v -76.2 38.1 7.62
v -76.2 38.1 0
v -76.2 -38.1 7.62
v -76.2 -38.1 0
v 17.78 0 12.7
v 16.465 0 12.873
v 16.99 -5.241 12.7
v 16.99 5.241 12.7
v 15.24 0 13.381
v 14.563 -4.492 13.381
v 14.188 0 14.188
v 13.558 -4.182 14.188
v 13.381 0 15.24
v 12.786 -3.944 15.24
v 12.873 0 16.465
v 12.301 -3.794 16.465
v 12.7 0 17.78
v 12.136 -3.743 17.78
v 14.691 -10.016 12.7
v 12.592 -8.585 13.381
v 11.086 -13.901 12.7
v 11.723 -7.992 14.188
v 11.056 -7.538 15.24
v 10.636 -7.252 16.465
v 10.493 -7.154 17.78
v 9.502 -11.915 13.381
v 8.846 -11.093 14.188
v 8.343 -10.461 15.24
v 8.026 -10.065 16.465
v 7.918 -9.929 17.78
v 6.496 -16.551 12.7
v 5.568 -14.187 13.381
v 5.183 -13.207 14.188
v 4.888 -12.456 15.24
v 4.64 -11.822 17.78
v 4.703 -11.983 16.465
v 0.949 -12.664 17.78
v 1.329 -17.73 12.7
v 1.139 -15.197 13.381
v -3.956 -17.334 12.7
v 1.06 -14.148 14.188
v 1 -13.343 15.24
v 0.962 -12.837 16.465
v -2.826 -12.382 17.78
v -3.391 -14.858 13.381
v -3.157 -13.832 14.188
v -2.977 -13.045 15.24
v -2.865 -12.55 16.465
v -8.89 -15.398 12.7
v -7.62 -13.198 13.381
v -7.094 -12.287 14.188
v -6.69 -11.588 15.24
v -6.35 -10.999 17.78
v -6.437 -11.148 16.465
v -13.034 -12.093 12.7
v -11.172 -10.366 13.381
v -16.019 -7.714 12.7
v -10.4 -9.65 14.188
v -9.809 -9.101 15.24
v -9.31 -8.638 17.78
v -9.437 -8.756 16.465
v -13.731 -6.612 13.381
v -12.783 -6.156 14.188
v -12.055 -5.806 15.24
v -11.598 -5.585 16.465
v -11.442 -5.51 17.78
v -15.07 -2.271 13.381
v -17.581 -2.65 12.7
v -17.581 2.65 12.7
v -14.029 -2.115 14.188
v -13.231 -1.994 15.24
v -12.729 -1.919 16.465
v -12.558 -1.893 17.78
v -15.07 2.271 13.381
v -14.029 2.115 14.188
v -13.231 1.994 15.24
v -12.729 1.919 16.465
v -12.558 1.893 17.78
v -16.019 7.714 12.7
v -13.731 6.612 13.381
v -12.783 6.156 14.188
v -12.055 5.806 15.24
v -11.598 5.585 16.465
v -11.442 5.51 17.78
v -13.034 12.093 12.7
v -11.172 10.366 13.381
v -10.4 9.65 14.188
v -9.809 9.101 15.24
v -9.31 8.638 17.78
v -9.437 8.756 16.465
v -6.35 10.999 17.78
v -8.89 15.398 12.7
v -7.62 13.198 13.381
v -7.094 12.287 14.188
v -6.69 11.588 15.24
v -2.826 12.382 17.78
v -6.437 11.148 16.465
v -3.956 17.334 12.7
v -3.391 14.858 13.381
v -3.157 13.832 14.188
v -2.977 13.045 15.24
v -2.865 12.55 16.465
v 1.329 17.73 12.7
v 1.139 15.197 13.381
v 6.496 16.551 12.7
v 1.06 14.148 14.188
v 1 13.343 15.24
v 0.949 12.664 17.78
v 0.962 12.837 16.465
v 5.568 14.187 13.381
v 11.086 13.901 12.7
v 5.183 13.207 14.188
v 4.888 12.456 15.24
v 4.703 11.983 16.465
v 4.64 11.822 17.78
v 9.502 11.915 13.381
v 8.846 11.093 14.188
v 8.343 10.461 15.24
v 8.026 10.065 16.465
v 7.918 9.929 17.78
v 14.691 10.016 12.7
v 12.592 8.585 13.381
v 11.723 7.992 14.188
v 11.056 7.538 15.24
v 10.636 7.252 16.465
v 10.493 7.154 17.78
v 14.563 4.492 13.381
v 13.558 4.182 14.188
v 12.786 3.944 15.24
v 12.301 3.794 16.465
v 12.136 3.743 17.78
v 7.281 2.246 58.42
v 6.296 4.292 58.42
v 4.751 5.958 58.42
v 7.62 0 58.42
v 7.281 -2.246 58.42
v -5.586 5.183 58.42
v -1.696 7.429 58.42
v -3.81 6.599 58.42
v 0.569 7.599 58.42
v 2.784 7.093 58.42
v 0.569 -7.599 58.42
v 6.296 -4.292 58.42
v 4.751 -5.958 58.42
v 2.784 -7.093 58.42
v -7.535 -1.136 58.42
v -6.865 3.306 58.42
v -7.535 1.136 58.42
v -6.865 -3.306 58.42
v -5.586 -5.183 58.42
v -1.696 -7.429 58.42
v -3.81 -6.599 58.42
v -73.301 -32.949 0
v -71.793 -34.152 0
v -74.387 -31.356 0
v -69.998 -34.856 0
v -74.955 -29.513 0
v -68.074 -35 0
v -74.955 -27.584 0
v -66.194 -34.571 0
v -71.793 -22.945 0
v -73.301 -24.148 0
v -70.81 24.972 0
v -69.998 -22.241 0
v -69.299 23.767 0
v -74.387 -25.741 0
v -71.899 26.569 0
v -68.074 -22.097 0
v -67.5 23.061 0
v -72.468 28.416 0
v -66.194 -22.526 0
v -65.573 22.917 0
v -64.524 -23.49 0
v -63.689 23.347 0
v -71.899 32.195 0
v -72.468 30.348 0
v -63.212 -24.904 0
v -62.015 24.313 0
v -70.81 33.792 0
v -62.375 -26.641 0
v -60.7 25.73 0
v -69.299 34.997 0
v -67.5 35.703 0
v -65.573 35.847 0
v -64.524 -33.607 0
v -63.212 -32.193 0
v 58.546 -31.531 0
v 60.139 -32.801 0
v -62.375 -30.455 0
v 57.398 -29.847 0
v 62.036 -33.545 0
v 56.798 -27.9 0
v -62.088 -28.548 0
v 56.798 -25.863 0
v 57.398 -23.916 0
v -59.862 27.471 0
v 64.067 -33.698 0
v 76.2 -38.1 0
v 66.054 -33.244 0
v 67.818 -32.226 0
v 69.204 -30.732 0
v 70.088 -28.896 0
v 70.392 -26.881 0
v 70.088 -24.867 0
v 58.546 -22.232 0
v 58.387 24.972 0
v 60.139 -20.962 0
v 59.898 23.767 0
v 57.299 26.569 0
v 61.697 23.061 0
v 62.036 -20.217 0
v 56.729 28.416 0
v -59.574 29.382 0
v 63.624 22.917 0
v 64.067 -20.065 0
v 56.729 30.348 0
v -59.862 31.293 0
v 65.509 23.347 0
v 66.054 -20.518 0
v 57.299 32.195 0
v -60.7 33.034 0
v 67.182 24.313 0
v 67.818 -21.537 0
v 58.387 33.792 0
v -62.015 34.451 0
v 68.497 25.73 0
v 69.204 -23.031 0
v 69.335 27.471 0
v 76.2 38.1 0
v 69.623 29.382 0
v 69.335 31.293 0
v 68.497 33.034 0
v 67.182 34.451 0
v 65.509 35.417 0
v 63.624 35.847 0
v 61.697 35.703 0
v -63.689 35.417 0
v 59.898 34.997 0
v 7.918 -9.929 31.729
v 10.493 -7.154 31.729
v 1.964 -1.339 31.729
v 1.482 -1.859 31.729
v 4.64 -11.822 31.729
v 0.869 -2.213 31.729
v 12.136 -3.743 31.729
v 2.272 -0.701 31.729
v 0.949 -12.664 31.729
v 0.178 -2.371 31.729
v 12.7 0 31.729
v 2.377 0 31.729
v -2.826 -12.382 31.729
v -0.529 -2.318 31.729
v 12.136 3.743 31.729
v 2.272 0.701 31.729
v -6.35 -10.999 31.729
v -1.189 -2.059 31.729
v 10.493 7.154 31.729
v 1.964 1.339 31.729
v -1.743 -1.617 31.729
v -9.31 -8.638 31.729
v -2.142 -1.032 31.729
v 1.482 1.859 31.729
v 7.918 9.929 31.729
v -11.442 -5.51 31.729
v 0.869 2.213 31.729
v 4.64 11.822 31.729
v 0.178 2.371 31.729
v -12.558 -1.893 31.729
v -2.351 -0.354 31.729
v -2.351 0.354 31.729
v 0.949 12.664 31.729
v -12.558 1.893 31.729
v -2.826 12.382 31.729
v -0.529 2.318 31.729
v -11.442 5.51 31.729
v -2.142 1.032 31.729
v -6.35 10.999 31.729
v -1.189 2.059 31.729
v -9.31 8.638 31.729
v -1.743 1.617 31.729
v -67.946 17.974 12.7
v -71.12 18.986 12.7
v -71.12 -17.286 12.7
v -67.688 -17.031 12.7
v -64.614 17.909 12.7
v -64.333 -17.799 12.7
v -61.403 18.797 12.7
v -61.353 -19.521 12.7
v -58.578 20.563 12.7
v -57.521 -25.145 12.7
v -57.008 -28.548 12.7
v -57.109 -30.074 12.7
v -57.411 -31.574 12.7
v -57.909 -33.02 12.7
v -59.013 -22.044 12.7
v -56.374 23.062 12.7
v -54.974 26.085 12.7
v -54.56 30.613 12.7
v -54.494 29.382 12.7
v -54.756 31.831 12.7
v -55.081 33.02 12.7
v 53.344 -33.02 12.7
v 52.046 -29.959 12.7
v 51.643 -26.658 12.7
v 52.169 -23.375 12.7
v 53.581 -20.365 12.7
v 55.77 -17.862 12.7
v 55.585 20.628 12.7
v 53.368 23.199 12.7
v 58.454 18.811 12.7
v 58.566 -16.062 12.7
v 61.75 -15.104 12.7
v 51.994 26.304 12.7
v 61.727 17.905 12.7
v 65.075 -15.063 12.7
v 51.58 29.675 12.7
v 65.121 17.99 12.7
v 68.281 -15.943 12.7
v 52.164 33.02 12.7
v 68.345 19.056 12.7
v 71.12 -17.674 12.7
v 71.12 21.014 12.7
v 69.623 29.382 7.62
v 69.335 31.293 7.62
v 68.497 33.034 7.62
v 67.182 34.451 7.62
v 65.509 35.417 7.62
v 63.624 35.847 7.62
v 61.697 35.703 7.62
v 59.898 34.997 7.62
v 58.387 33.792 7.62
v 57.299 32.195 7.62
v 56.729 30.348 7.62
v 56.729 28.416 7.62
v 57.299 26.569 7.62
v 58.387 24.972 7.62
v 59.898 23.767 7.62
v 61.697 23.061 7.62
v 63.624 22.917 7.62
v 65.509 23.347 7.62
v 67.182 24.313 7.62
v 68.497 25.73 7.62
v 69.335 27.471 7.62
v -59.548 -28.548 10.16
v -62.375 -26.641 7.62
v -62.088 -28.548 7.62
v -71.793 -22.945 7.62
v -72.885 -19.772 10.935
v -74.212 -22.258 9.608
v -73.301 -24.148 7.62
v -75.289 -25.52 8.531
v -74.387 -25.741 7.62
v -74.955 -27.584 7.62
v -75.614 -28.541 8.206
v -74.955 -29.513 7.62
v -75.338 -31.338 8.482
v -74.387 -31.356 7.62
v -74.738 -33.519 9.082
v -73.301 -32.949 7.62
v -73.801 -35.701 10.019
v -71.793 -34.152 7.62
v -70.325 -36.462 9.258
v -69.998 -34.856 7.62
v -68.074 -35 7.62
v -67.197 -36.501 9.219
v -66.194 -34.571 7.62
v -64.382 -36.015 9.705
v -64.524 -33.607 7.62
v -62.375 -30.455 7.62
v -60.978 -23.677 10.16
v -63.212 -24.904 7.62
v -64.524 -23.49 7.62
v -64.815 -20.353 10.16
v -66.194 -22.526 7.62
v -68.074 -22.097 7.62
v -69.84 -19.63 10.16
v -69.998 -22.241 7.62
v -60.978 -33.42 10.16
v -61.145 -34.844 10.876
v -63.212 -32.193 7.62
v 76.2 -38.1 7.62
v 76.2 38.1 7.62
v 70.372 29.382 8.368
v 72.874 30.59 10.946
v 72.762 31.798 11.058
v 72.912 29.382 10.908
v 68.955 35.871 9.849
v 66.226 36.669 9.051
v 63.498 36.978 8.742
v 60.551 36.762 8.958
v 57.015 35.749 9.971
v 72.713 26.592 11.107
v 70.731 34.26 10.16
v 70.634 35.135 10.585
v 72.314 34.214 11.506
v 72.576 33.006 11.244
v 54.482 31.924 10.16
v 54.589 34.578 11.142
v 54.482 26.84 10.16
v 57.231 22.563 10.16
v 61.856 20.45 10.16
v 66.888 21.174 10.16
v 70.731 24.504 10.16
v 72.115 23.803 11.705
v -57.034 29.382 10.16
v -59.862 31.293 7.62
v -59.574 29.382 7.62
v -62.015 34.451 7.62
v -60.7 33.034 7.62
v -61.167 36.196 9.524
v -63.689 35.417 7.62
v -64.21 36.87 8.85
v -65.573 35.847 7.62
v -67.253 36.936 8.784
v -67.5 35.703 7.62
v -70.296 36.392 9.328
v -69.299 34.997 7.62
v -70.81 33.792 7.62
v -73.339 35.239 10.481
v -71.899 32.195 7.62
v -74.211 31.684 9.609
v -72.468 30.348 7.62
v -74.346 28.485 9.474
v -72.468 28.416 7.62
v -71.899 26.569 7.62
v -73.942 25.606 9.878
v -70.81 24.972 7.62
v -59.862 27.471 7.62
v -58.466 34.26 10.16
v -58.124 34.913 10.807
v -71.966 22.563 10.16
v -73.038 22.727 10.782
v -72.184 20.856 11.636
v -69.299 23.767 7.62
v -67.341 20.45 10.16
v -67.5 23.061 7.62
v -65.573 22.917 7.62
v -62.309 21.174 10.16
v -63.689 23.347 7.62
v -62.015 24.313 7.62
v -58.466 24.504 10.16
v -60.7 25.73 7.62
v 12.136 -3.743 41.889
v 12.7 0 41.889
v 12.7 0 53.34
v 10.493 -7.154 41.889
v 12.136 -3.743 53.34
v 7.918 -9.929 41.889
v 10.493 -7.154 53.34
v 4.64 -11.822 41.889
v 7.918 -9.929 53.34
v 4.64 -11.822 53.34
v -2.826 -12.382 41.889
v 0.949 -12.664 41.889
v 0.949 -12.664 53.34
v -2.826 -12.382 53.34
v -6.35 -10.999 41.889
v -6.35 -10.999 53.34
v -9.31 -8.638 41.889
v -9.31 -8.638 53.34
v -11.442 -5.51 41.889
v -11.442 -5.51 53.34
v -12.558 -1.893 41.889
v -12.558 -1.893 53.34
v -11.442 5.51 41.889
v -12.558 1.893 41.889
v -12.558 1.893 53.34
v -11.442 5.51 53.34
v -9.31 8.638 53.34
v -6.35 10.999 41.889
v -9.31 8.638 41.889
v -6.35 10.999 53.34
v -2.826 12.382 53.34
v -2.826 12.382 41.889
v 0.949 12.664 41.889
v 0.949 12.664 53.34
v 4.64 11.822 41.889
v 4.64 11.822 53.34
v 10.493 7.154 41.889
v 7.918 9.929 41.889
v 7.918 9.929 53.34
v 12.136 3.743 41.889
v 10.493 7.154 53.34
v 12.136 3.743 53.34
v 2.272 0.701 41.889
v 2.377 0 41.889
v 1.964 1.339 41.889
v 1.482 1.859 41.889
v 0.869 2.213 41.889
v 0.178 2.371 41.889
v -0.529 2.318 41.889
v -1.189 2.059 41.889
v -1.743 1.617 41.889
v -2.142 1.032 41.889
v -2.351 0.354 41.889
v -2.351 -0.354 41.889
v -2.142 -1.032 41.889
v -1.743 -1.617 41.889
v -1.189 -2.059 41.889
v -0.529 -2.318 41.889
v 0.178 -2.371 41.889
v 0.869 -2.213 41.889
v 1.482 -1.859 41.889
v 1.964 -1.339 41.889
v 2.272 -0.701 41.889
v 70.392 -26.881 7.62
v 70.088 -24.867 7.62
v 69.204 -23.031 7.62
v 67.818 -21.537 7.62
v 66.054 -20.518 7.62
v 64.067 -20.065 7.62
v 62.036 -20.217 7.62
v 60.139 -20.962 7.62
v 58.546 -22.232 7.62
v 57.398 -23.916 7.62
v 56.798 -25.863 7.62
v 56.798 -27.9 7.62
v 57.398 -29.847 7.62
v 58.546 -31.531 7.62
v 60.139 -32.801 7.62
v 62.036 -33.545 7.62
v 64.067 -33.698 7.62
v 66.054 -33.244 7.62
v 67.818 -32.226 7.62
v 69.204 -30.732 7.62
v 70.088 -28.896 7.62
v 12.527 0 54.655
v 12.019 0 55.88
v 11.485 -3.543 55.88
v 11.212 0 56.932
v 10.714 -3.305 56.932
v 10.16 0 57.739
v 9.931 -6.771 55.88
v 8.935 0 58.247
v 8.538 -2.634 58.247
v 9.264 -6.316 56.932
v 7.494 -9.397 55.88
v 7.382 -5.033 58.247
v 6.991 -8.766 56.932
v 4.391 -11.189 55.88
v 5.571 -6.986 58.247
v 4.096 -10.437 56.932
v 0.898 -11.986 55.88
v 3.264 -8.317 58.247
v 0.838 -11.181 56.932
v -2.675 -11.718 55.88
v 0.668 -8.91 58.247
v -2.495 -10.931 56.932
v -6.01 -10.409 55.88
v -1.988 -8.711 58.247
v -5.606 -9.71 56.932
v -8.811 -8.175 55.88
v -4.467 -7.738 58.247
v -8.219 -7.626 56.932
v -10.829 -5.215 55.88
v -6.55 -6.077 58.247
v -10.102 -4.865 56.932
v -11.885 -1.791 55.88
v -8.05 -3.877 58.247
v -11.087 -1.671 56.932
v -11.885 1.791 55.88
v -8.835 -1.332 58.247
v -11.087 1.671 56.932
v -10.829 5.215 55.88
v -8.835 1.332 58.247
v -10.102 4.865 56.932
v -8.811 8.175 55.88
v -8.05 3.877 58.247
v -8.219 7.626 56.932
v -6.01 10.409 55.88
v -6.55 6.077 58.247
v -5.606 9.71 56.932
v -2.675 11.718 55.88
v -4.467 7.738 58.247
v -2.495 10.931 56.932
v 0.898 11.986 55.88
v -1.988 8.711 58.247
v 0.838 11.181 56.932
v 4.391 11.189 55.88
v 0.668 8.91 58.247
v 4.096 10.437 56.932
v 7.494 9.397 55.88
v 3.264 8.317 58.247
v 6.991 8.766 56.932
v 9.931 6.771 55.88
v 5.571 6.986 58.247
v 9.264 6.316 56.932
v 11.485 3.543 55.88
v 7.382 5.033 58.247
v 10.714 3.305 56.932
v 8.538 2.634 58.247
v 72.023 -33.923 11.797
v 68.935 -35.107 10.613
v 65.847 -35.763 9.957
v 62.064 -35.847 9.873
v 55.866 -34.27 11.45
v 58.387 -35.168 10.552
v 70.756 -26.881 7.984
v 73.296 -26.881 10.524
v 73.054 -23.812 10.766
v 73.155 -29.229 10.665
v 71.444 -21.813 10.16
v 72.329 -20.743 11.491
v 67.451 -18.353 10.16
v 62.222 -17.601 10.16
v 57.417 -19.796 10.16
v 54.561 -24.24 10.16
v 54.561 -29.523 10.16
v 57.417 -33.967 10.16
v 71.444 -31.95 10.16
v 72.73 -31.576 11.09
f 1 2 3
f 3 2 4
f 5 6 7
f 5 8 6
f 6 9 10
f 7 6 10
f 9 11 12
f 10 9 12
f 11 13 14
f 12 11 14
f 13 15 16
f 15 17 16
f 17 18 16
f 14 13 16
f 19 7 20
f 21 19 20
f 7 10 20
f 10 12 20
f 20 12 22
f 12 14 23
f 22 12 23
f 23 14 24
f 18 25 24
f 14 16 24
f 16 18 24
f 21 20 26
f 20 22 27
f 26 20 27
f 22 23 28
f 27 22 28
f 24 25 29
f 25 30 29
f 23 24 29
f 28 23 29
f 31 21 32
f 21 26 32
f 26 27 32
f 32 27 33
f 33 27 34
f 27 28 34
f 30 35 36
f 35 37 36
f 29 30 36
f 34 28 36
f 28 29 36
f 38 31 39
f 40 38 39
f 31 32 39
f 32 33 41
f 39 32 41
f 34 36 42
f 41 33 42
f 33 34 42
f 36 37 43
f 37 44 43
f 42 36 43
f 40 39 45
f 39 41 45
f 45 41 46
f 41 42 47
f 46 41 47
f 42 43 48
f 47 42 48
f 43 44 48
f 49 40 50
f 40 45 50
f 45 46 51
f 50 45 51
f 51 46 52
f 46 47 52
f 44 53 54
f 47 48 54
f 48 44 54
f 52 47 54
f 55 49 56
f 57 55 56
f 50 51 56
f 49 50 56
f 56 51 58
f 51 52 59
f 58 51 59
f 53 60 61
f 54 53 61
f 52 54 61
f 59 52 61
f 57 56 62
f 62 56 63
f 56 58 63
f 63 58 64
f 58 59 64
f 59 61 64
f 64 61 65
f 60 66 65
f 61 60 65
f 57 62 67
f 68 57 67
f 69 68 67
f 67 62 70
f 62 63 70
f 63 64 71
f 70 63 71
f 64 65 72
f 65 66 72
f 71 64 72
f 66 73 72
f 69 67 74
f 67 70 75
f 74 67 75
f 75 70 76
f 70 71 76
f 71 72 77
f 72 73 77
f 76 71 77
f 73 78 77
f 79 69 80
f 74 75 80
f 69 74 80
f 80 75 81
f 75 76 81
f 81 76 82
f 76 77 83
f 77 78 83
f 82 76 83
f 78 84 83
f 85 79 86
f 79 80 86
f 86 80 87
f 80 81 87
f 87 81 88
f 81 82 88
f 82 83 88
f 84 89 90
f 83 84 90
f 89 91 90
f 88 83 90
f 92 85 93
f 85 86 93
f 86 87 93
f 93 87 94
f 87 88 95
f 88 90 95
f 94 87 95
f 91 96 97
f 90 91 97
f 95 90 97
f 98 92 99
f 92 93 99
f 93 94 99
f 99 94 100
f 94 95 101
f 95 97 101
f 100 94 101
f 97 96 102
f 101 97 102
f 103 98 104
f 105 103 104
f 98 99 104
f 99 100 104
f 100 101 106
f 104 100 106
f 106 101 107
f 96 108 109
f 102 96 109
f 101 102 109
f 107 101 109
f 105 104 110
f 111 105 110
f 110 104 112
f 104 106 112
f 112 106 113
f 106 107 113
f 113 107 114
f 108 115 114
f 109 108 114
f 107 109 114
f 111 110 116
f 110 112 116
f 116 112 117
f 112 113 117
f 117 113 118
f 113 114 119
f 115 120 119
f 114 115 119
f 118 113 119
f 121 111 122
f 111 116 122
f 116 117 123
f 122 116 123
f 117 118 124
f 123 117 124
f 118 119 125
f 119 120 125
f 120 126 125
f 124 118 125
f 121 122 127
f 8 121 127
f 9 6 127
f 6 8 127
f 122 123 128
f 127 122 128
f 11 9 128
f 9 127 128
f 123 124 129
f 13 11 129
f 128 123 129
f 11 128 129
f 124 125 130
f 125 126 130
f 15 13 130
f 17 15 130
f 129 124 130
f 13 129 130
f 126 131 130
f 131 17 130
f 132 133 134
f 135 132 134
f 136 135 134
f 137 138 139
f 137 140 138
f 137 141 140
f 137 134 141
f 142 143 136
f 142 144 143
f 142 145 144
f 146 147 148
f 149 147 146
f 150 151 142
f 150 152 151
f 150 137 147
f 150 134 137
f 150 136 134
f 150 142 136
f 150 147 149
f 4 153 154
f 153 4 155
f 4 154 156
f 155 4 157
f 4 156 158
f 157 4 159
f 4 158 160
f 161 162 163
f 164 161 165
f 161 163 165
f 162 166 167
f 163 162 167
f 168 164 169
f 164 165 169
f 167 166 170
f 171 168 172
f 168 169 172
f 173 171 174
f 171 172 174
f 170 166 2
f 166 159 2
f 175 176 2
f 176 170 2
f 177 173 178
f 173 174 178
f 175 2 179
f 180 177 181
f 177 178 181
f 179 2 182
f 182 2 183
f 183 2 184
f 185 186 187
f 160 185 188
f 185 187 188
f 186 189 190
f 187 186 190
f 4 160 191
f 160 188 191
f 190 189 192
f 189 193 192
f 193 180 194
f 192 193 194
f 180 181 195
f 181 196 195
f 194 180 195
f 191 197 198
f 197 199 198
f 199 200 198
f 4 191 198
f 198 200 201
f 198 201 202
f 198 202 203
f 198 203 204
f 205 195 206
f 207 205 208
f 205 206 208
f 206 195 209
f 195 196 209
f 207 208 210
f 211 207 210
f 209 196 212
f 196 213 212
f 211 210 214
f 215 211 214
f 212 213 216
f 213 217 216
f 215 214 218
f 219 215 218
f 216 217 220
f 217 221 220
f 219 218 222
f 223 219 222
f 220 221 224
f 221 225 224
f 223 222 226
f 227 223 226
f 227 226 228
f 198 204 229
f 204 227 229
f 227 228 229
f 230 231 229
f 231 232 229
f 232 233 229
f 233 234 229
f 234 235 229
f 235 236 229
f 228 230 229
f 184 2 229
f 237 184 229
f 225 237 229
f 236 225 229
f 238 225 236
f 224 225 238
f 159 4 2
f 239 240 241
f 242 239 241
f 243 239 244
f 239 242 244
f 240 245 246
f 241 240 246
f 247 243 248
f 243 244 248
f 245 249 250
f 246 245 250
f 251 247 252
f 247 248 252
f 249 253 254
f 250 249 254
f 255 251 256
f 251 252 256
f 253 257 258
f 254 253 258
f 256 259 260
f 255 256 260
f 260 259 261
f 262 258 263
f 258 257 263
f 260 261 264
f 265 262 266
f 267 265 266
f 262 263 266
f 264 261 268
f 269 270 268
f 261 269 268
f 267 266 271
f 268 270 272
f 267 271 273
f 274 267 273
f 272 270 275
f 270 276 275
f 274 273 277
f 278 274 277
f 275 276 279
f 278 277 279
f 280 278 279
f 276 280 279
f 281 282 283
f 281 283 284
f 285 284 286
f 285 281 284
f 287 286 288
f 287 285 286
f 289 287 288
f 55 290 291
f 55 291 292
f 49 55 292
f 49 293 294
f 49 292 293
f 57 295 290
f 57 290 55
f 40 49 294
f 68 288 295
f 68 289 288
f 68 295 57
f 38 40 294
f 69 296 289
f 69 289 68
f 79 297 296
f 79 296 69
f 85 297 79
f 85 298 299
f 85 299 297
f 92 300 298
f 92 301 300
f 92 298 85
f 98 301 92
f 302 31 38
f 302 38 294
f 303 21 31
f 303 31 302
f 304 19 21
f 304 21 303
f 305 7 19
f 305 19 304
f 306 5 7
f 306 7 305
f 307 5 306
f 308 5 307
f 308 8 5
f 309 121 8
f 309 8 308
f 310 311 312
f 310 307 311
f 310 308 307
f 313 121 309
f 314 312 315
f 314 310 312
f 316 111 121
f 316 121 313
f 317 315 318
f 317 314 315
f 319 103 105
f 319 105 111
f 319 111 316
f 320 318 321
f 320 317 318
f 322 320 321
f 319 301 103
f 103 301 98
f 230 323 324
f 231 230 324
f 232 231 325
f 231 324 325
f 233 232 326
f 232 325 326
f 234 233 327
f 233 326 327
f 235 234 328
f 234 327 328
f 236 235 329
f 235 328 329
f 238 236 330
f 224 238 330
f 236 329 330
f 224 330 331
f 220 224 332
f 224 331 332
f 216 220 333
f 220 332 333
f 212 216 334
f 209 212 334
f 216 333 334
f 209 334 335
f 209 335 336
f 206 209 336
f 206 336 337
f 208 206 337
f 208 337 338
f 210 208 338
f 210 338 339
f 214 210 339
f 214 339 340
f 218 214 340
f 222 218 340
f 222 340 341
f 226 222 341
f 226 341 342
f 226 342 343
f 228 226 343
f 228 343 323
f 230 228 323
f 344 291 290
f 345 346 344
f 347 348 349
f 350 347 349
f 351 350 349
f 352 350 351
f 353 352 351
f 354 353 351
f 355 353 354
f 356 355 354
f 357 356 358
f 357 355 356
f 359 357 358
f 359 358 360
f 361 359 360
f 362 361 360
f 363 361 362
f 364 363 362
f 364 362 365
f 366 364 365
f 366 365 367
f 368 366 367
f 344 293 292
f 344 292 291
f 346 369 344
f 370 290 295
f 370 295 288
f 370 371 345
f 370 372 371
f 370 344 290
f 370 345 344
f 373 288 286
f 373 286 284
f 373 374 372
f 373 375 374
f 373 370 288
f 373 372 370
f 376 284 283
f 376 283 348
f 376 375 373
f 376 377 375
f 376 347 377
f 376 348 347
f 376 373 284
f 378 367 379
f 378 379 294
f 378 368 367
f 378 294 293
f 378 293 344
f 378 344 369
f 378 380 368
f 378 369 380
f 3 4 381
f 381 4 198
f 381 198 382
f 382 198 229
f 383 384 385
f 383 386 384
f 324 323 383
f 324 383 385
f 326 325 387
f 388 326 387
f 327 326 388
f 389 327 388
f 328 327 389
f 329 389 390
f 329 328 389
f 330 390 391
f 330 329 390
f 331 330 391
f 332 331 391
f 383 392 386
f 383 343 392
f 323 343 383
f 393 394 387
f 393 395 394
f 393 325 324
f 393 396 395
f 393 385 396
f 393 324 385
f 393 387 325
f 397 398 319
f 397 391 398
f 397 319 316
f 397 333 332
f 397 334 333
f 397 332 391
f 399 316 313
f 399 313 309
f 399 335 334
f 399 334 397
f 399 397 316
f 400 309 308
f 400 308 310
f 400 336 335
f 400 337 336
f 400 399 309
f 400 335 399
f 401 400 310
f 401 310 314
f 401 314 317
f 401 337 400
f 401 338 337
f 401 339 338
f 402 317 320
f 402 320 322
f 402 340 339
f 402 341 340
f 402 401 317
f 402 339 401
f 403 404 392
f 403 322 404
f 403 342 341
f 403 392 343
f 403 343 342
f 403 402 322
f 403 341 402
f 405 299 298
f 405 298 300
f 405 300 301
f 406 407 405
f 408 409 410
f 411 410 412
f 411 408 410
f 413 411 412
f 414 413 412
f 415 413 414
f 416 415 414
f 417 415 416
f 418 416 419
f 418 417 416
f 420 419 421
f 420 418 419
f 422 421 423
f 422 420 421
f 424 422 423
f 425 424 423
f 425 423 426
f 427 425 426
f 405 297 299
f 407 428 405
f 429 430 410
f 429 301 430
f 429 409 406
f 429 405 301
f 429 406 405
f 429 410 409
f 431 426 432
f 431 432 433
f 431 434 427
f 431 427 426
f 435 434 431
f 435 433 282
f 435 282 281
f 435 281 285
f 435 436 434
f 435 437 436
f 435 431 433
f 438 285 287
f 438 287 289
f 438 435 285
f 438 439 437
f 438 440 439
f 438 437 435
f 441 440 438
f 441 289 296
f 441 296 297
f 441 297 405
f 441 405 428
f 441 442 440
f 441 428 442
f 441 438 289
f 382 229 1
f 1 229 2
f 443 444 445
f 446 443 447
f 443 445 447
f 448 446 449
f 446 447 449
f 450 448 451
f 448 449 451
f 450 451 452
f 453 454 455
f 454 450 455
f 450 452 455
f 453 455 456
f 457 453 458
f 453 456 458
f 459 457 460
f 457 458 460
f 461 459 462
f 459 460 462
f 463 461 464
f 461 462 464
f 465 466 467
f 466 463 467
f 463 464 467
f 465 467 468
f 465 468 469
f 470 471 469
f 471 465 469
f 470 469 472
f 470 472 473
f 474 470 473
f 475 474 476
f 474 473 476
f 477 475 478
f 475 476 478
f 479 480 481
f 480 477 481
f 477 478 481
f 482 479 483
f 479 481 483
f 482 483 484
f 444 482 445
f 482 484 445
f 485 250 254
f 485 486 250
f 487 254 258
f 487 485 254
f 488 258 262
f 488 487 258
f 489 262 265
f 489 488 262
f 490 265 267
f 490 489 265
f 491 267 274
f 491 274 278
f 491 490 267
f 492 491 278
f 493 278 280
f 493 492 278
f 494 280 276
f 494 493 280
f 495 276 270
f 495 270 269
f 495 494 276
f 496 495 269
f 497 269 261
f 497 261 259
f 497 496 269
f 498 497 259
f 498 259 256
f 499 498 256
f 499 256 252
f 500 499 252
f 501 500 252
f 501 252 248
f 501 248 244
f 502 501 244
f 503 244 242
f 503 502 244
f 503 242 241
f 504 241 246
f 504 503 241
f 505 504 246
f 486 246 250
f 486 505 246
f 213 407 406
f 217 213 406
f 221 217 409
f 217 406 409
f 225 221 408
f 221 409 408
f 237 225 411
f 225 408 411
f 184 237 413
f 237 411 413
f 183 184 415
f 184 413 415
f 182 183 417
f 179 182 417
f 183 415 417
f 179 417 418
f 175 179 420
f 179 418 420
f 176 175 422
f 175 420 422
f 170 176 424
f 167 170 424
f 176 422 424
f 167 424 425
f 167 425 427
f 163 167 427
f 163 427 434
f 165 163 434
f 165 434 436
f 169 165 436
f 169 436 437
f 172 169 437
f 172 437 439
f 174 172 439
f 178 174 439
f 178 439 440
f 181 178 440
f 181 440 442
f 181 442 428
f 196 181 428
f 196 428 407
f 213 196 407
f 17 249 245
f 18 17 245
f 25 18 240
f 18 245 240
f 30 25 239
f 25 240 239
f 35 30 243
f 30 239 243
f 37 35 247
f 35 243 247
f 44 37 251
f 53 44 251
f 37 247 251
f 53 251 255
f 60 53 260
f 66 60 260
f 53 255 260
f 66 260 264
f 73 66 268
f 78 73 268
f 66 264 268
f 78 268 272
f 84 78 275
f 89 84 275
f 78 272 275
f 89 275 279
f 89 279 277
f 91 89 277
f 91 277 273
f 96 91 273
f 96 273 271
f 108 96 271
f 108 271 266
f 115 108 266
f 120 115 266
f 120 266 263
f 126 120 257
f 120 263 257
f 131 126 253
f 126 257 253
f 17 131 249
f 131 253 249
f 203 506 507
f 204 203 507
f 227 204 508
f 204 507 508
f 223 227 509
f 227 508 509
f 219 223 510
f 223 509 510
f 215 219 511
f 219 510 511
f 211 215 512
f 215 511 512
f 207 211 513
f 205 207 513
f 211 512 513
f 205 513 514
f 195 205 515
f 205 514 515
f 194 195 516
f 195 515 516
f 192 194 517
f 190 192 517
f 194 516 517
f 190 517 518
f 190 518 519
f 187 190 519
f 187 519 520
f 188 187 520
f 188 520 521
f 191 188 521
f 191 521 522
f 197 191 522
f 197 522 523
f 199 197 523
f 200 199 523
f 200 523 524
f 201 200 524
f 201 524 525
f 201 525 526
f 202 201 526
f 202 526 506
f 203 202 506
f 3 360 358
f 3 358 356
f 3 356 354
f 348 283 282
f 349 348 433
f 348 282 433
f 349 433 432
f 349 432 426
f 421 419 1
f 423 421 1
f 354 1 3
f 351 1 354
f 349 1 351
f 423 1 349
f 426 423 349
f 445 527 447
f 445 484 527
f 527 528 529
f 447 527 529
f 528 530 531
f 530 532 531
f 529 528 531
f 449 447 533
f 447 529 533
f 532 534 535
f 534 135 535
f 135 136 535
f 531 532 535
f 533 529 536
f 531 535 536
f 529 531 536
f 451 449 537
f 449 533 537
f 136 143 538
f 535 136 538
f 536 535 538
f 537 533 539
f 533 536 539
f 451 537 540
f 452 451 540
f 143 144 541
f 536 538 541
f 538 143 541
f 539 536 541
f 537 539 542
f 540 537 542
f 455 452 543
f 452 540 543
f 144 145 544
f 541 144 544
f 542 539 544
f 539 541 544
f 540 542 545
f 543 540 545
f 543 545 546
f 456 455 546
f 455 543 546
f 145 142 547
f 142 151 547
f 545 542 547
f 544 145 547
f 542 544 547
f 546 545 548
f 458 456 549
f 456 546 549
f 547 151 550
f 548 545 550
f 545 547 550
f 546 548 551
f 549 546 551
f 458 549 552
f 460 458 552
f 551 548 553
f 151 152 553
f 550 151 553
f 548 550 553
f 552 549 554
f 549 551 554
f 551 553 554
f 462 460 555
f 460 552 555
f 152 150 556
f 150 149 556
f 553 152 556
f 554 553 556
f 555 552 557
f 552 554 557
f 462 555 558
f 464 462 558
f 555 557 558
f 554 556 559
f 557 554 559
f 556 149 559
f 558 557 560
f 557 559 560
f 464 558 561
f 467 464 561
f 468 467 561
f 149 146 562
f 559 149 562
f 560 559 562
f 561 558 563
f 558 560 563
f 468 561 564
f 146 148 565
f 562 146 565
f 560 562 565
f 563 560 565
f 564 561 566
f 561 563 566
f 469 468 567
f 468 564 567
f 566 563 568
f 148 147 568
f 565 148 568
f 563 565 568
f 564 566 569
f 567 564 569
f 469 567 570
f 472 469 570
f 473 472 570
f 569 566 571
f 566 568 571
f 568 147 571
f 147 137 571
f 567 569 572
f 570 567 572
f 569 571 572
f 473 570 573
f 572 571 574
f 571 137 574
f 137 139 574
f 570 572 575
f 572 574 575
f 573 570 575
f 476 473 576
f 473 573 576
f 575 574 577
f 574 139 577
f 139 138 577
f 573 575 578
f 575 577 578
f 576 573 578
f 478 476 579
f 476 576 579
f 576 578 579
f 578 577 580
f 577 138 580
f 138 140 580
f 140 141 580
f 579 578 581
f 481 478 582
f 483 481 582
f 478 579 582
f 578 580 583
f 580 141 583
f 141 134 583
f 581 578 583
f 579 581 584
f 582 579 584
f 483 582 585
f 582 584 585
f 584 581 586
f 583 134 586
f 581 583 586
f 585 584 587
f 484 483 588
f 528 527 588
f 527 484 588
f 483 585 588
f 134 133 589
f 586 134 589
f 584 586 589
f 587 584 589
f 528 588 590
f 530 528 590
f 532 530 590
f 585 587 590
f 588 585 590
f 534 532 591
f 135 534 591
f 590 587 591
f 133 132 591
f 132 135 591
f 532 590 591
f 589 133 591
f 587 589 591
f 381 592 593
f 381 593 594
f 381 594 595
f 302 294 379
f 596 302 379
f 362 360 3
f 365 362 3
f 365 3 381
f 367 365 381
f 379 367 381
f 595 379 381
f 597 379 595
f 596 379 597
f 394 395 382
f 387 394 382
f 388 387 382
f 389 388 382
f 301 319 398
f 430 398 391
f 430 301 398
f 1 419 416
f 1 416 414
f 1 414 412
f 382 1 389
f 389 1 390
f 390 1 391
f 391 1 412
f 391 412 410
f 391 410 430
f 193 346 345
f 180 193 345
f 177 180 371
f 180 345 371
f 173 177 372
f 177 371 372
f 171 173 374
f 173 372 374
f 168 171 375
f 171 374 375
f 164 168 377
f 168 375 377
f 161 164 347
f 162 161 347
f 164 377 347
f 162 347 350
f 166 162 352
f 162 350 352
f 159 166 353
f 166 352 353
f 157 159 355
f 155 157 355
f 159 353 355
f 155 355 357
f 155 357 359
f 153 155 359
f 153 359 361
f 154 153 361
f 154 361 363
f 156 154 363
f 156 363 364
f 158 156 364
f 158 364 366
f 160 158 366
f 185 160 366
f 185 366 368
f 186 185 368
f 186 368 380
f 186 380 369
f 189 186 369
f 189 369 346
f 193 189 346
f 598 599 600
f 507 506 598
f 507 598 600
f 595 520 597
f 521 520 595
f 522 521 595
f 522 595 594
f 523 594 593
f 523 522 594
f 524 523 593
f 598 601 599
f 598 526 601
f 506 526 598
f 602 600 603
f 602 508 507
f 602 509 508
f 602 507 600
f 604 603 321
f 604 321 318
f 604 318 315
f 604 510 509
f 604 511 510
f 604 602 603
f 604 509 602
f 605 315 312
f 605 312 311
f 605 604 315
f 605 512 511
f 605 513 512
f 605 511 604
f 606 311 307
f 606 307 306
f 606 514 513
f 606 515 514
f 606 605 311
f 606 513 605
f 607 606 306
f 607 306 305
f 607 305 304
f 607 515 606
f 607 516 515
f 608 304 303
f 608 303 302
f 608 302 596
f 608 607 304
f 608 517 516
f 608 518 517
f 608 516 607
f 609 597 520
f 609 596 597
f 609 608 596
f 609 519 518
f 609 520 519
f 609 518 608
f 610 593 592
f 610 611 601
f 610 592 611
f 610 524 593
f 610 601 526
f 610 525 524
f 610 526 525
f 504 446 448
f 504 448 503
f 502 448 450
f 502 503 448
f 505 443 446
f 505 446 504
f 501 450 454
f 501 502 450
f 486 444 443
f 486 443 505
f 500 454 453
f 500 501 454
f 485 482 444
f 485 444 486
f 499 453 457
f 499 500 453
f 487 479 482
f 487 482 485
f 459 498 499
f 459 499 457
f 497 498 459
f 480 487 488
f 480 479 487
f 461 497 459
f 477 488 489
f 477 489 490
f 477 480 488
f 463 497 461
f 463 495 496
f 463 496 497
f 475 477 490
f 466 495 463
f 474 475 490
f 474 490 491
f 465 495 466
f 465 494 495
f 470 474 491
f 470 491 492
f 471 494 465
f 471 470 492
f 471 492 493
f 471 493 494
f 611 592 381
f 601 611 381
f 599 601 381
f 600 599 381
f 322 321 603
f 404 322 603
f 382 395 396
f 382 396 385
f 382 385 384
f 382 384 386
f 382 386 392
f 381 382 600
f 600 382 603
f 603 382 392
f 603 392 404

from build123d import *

# Parameters (mm, degrees)
F1_DEPTH     = 12.7
F3_R         = 7.826189497
F3_R_2       = 7.6449247614
F3_R_3       = 9.3914167861
F3_R_4       = 7.5169302634
F2_R         = 6.8354514468
F2_R_2       = 6.4833469735
F2_R_3       = 6.4699307045
F2_R_4       = 6.483339071
F4_DEPTH     = 25.4
F5_W         = 12.7
F5_H         = 45.72
F7_W         = 12.7
F7_H         = 10.16
F9_R         = 5.08
F10_T1_DEPTH = 102.3282991577
F10_T3_DEPTH = 178.5282991577


# Not quite as in the source:
# - a fillet or chamfer that OpenCascade refuses, or shapes differently, is made with other operations: its cross-section is extruded or revolved along the edge and cut away or added


with BuildPart() as f1:
    # F0 (on Top) → F1 (new body)
    with BuildSketch(Plane.XY):
        Polygon((76.2, 21.421205096), (76.2, 38.1), (-76.2, 38.1), (-76.2, -38.1), (76.2, -38.1), align=None)
    extrude(amount=F1_DEPTH)

    # F3 (on face) + F2 (on face) → F4 (cut)
    with BuildSketch(Plane.XY):
        with Locations((-66.4894506335, 28.616681695)):
            Circle(F3_R)
        with Locations((60.850225389, 29.538076371)):
            Circle(F3_R_2)
        with Locations((62.7190470695, -24.263875559)):
            Circle(F3_R_3)
        with Locations((-67.1401694417, -24.8782932758)):
            Circle(F3_R_4)
    with BuildSketch(Plane.XY.offset(12.7)):
        with Locations((63.5566338897, -26.8813353032)):
            Circle(F2_R)
        with Locations((63.1398707628, 29.3819215149)):
            Circle(F2_R_2)
        with Locations((-68.5578212142, -28.5483933985)):
            Circle(F2_R_3)
        with Locations((-66.0572275519, 29.3819215149)):
            Circle(F2_R_4)
    extrude(amount=-F4_DEPTH, mode=Mode.SUBTRACT)

    # F5 (on Front) → F6 (revolve)
    with BuildSketch(Plane.XZ):
        with Locations((6.35, 35.56)):
            Rectangle(F5_W, F5_H)
    revolve(axis=Axis((0, 0, 35.56), (0, 0, -1)))

    # F7 (on Front) → F8 (revolve, cut)
    with BuildSketch(Plane.XZ):
        with Locations((8.7274818003, 36.8085707384)):
            Rectangle(F7_W, F7_H)
    revolve(axis=Axis((0, 0, 12.7), (0, 0, 1)), mode=Mode.SUBTRACT)

    # F9
    f9_edges = [f1.edges().sort_by_distance(p)[0] for p in [
        (-12.7, 0, 58.42),
        (-12.7, 0, 12.7),
    ]]
    fillet(f9_edges, radius=F9_R)

    # F10: chamfer of 5.08 on 9 edges, made by hand

    # F10_s2 → F10_t1 (cut)
    with BuildSketch(Plane.XZ.offset(-51.1641495789)):
        Polygon((71.12, 12.7), (76.2, 7.62), (76.2, 12.7), align=None)
        Polygon((-71.12, 12.7), (-76.2, 7.62), (-76.2, 12.7), align=None)
    extrude(amount=F10_T1_DEPTH, mode=Mode.SUBTRACT)

    # F10_s4 → F10_t3 (cut)
    with BuildSketch(Plane.YZ.offset(-89.2641495789)):
        Polygon((33.02, 12.7), (38.1, 7.62), (38.1, 12.7), align=None)
        Polygon((-33.02, 12.7), (-38.1, 7.62), (-38.1, 12.7), align=None)
    extrude(amount=F10_T3_DEPTH, mode=Mode.SUBTRACT)

    # F10_s5 → F10_t6 (revolve, cut)
    with BuildSketch(Plane.XZ.offset(28.5483933985)):
        Polygon((-57.0078905097, 12.7), (-62.0878905097, 7.62), (-62.0878905097, 12.7), align=None)
    revolve(axis=Axis((-68.5578212142, -28.5483933985, 12.7), (0, 0, 1)), mode=Mode.SUBTRACT)

    # F10_s7 → F10_t8 (revolve, cut)
    with BuildSketch(Plane.XZ.offset(26.8813353032)):
        Polygon((75.4720853364, 12.7), (70.3920853364, 7.62), (70.3920853364, 12.7), align=None)
    revolve(axis=Axis((63.5566338897, -26.8813353032, 12.7), (0, 0, 1)), mode=Mode.SUBTRACT)

    # F10_s9 → F10_t10 (revolve, cut)
    with BuildSketch(Plane.XZ.offset(-29.3819215149)):
        Polygon((-54.493888481, 12.7), (-59.573888481, 7.62), (-59.573888481, 12.7), align=None)
    revolve(axis=Axis((-66.0572275519, 29.3819215149, 12.7), (0, 0, 1)), mode=Mode.SUBTRACT)

    # F10_s11 → F10_t12 (revolve, cut)
    with BuildSketch(Plane.XZ.offset(-29.3819215149)):
        Polygon((74.7032177363, 12.7), (69.6232177363, 7.62), (69.6232177363, 12.7), align=None)
    revolve(axis=Axis((63.1398707628, 29.3819215149, 12.7), (0, 0, 1)), mode=Mode.SUBTRACT)


solid = f1.part
